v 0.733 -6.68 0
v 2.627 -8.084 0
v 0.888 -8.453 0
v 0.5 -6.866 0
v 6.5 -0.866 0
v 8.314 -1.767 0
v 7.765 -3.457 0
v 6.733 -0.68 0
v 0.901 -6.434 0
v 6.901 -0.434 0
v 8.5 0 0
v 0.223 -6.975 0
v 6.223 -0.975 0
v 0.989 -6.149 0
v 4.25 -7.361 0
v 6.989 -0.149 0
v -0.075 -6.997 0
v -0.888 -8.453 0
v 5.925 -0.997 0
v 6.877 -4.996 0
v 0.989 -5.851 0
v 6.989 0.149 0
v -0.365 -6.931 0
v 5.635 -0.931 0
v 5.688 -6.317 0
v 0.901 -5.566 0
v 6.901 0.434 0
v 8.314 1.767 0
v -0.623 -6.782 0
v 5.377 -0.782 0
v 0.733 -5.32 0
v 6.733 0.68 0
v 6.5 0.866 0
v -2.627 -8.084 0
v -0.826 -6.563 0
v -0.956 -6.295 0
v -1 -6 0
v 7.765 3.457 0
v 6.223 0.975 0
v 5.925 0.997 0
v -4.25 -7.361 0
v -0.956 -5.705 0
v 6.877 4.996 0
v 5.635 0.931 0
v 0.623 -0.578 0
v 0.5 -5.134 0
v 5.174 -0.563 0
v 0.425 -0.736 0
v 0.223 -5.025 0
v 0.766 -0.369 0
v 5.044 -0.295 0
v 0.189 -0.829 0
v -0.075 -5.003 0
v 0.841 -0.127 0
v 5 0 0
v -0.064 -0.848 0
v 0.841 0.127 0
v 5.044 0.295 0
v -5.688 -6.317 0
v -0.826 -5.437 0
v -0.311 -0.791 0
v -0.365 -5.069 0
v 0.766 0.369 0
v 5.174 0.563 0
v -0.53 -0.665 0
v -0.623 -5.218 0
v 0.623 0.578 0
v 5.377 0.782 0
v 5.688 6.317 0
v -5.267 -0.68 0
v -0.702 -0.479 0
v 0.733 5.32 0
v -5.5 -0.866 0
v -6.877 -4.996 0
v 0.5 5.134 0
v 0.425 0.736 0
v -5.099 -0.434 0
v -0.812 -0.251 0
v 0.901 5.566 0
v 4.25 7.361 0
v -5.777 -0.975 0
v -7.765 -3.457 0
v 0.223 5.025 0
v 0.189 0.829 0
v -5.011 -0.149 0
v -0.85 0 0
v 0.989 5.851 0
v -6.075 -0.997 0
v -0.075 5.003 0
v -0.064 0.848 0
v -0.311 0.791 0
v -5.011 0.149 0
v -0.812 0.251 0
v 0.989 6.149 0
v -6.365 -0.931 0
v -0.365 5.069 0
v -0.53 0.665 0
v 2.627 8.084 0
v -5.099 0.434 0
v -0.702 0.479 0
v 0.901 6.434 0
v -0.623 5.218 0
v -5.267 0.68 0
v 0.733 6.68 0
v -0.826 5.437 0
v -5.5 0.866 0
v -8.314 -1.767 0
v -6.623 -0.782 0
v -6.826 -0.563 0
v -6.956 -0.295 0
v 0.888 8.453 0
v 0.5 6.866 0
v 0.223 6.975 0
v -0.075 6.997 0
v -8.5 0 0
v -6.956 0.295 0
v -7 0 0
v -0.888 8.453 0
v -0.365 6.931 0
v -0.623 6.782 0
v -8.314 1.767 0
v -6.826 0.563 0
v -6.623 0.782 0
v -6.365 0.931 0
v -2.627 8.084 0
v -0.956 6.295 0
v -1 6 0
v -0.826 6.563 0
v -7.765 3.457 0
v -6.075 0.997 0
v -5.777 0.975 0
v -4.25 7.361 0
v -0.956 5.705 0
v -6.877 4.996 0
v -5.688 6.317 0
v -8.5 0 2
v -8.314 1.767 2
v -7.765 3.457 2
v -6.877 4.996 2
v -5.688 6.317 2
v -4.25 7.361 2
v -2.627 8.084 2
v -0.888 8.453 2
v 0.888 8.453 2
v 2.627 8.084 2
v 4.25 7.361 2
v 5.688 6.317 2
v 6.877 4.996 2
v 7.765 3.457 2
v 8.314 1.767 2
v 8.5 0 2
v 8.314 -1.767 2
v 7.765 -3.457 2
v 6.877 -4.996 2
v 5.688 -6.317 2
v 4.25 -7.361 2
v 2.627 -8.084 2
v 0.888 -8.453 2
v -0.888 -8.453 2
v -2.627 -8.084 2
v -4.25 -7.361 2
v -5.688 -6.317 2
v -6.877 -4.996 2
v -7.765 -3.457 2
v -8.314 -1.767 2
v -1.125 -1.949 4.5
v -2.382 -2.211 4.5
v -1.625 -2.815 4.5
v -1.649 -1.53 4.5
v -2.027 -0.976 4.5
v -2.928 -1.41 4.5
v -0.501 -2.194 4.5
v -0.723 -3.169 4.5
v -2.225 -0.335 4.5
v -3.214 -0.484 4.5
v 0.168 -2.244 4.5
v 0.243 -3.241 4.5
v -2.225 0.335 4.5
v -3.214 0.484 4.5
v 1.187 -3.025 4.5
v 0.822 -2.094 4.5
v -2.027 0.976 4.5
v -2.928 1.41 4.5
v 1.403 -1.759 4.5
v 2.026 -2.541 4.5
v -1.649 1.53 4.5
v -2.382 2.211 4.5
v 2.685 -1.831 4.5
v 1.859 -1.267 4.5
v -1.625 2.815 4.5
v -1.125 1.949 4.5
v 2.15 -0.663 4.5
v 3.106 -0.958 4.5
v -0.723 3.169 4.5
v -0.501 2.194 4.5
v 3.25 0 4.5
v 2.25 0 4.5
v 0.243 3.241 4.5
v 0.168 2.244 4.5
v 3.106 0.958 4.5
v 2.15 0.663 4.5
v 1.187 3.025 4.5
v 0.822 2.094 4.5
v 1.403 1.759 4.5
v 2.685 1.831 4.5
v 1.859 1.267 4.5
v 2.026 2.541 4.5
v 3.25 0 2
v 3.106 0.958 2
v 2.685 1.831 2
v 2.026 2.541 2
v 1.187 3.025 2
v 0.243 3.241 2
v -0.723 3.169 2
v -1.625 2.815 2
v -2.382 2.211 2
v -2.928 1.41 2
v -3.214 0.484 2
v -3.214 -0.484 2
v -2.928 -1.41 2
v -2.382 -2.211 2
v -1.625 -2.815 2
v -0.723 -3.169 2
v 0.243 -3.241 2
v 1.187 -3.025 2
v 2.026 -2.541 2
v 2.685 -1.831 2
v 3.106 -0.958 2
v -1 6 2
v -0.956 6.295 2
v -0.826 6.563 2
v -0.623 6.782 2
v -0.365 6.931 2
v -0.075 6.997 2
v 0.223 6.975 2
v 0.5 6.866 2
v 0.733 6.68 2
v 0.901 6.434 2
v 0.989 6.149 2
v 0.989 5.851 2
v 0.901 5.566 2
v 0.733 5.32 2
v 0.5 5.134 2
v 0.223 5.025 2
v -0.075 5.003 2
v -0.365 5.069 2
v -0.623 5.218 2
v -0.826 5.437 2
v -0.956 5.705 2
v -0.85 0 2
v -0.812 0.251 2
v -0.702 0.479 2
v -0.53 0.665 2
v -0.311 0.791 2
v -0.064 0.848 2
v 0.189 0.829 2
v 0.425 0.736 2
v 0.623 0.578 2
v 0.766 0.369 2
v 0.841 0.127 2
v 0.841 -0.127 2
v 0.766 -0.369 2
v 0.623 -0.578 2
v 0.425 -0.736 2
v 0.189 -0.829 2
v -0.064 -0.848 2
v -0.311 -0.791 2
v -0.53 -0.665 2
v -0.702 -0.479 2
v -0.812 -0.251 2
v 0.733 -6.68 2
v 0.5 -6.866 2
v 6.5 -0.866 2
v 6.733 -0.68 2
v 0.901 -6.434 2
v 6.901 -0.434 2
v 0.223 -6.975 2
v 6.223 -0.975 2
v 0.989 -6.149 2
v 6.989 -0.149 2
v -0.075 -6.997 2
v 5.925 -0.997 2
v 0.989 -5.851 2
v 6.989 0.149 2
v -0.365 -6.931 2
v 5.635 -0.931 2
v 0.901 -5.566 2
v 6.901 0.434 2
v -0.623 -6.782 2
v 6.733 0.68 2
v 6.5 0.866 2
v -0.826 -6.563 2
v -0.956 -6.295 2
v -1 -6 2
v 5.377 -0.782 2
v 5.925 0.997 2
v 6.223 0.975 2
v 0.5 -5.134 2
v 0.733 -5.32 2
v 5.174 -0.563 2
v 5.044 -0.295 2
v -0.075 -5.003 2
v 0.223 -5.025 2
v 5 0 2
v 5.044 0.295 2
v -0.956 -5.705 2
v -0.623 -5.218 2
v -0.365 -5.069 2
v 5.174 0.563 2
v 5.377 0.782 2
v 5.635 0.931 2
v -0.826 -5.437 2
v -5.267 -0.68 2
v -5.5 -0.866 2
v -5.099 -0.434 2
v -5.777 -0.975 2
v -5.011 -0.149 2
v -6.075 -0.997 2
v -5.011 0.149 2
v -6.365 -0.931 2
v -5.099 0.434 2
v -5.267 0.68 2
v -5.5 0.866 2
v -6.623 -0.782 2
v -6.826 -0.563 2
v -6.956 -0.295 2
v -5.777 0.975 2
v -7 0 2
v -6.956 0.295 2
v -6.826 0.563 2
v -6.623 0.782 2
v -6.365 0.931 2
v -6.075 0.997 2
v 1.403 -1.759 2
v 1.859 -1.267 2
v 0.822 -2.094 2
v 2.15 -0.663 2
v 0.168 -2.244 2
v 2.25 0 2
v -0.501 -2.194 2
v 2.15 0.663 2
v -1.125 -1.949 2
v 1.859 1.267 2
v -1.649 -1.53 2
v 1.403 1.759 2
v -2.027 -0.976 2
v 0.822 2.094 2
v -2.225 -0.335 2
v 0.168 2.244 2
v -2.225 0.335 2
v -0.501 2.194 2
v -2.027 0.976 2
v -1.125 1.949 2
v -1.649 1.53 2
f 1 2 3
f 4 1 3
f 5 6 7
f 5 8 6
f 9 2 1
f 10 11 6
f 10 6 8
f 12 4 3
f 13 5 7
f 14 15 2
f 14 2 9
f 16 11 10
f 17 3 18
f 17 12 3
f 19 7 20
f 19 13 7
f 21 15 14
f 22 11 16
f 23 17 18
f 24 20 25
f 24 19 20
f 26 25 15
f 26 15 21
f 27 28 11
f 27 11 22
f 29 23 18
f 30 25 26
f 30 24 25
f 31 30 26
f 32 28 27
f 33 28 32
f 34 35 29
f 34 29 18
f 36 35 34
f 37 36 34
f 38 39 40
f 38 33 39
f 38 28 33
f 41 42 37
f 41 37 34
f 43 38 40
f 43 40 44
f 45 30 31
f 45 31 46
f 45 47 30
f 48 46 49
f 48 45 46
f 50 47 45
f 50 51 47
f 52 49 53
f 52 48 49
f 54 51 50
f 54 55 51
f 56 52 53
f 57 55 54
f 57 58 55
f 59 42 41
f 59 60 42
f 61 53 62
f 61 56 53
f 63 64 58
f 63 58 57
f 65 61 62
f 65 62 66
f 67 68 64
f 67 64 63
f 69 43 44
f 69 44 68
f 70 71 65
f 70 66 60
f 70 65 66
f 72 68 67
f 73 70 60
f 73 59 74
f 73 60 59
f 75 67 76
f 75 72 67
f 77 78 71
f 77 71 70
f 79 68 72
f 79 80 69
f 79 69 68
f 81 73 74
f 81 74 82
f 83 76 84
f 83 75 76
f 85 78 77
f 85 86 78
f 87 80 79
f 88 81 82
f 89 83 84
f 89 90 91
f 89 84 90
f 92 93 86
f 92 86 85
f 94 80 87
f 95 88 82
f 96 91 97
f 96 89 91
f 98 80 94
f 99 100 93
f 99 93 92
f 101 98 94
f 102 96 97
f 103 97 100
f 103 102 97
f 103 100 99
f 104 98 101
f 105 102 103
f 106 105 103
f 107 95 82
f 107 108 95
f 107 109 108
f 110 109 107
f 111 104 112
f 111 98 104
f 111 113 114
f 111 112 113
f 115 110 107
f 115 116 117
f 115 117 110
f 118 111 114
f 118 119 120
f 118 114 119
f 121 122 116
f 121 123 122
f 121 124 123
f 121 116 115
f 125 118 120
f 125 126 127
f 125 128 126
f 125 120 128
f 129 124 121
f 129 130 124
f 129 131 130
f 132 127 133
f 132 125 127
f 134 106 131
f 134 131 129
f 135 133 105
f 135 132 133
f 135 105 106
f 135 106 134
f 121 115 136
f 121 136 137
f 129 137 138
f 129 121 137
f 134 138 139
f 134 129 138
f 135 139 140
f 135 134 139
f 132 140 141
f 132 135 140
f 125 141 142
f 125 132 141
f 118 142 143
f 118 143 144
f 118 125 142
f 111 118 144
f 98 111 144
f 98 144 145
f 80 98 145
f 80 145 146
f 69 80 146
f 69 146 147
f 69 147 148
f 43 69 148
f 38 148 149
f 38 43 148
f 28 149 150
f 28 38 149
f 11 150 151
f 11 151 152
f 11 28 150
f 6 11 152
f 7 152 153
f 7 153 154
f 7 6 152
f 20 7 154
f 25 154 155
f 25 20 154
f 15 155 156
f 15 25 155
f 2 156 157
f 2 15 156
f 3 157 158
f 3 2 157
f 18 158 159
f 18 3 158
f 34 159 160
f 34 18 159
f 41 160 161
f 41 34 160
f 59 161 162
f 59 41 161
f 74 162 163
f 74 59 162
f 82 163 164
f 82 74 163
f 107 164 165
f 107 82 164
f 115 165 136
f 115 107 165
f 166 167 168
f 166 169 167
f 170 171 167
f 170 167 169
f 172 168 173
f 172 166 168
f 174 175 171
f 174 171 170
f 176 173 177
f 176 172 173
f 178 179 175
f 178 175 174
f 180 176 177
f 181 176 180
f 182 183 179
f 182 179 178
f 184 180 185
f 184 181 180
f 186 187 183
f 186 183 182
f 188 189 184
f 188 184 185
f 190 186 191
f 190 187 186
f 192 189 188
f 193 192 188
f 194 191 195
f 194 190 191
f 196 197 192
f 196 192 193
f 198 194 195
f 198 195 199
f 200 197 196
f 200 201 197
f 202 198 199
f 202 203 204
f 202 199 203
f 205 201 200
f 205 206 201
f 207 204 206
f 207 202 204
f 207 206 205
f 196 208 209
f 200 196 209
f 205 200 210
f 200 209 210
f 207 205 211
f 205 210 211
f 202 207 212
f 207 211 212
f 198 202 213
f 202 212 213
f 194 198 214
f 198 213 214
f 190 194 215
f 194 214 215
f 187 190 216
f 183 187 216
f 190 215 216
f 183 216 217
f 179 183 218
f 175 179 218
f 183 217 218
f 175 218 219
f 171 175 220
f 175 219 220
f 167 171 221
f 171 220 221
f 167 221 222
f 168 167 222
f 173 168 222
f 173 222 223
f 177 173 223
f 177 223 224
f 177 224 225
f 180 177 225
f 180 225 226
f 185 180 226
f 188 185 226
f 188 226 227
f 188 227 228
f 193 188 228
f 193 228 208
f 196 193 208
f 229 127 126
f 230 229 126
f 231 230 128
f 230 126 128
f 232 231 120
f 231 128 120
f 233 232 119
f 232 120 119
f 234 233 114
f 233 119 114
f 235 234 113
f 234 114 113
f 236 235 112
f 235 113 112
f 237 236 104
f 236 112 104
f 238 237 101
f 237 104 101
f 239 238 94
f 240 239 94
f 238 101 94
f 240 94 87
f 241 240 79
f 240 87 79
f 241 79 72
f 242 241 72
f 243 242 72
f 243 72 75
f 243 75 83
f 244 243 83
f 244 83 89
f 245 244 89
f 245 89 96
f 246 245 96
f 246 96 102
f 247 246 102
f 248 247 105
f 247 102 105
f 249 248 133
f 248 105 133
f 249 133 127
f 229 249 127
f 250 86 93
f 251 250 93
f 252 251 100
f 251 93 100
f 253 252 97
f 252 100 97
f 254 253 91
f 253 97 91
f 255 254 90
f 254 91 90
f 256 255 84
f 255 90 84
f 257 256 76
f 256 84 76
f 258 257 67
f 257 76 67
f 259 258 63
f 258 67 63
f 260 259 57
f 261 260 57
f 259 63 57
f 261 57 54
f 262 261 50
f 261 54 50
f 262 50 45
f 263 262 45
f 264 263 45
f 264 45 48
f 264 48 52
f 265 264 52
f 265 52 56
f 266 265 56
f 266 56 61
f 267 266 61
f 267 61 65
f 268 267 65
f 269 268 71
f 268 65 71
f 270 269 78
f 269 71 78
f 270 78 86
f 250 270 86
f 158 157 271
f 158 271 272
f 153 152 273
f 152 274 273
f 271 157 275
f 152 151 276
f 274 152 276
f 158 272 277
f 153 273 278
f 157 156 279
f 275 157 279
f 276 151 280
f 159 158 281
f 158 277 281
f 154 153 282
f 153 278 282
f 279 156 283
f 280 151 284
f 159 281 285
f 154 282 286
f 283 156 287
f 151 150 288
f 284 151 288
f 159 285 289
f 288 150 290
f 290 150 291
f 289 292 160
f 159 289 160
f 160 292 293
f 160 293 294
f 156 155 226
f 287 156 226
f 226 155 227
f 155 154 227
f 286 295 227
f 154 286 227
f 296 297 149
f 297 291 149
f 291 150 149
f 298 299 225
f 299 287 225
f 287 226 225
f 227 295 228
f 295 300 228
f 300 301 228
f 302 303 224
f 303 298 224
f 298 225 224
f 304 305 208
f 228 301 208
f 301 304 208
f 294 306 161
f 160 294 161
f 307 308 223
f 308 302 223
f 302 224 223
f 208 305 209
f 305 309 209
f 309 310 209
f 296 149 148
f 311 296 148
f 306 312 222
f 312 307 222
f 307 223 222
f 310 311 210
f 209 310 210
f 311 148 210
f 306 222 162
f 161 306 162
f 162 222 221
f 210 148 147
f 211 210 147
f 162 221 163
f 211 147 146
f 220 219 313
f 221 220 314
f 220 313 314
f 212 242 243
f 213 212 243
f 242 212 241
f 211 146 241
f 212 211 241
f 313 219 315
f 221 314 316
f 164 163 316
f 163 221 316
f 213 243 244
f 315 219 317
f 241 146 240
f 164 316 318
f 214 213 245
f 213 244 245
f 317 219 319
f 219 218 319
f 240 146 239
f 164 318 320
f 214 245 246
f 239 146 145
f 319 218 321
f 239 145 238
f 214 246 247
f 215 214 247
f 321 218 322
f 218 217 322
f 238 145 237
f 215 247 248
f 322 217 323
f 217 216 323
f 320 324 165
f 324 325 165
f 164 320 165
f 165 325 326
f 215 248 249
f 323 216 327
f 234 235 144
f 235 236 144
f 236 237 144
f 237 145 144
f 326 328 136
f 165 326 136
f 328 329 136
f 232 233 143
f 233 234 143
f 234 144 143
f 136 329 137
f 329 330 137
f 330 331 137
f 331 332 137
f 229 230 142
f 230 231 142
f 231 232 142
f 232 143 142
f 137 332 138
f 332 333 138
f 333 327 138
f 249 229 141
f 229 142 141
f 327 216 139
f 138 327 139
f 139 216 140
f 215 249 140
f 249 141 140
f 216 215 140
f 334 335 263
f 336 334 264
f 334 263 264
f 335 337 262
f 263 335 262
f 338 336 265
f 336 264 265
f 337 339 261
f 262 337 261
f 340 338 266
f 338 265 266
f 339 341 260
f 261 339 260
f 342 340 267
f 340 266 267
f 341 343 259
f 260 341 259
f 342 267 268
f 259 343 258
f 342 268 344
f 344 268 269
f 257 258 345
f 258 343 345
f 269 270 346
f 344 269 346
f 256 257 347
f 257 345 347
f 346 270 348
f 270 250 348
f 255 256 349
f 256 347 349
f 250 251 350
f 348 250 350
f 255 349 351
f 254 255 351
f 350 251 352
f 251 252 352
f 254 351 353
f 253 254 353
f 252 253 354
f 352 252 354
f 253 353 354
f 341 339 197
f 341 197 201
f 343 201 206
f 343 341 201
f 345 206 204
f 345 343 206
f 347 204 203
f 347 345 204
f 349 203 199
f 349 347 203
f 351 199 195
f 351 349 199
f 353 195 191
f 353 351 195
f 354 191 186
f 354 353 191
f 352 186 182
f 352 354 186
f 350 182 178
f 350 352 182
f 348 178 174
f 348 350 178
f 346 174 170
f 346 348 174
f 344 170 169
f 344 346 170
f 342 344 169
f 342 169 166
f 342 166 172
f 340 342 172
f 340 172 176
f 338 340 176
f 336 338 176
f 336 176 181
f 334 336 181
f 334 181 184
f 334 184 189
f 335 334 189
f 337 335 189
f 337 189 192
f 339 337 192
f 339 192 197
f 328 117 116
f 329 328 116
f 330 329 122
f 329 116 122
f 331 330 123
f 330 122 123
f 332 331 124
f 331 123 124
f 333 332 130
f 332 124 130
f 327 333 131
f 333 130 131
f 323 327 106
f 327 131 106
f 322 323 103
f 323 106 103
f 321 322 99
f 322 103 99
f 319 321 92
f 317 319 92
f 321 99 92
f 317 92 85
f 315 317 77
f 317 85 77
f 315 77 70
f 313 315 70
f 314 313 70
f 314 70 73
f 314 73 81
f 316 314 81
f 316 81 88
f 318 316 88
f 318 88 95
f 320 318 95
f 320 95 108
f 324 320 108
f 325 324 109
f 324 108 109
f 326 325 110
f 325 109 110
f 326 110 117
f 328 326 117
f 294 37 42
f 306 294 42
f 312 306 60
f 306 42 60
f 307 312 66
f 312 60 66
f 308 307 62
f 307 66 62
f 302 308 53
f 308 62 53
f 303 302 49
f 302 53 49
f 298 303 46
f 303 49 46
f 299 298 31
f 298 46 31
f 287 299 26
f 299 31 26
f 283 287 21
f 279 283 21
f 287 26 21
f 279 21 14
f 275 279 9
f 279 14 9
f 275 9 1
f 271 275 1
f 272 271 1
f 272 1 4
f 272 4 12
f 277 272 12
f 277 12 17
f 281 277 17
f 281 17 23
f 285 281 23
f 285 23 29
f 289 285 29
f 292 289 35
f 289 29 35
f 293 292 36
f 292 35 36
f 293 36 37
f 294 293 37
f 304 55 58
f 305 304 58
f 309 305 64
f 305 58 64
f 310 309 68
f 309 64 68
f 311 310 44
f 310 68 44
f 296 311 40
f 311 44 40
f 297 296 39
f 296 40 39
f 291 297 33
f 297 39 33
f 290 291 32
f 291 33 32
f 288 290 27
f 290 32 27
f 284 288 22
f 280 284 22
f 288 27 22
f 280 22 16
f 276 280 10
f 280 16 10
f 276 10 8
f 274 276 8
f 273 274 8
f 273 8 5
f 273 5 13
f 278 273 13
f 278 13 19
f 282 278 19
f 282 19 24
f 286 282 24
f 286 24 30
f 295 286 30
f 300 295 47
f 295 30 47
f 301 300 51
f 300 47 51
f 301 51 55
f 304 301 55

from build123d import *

# Parameters (mm, degrees)
SKETCH1_R           = 3.25
SKETCH1_R_2         = 2.25
BOSS_EXTRUDE1_DEPTH = 4.5
SKETCH2_R           = 8.5
SKETCH2_R_2         = 0.85
SKETCH2_R_3         = 1
BOSS_EXTRUDE2_DEPTH = 2


with BuildPart() as part:
    # Sketch1 → Boss-Extrude1 (new body)
    with BuildSketch(Plane.XY):
        Circle(SKETCH1_R)
        Circle(SKETCH1_R_2, mode=Mode.SUBTRACT)
    extrude(amount=BOSS_EXTRUDE1_DEPTH)

    # Sketch2 → Boss-Extrude2 (add)
    with BuildSketch(Plane(origin=(0, 0, 0), x_dir=(-1, 0, 0), z_dir=(0, 0, -1))):
        Circle(SKETCH2_R)
        Circle(SKETCH2_R_2, mode=Mode.SUBTRACT)
        with Locations((-6, 0)):
            Circle(SKETCH2_R_3, mode=Mode.SUBTRACT)
        with Locations((0, 6)):
            Circle(SKETCH2_R_3, mode=Mode.SUBTRACT)
        with Locations((6, 0)):
            Circle(SKETCH2_R_3, mode=Mode.SUBTRACT)
        with Locations((0, -6)):
            Circle(SKETCH2_R_3, mode=Mode.SUBTRACT)
    extrude(amount=-BOSS_EXTRUDE2_DEPTH)


solid = part.part
